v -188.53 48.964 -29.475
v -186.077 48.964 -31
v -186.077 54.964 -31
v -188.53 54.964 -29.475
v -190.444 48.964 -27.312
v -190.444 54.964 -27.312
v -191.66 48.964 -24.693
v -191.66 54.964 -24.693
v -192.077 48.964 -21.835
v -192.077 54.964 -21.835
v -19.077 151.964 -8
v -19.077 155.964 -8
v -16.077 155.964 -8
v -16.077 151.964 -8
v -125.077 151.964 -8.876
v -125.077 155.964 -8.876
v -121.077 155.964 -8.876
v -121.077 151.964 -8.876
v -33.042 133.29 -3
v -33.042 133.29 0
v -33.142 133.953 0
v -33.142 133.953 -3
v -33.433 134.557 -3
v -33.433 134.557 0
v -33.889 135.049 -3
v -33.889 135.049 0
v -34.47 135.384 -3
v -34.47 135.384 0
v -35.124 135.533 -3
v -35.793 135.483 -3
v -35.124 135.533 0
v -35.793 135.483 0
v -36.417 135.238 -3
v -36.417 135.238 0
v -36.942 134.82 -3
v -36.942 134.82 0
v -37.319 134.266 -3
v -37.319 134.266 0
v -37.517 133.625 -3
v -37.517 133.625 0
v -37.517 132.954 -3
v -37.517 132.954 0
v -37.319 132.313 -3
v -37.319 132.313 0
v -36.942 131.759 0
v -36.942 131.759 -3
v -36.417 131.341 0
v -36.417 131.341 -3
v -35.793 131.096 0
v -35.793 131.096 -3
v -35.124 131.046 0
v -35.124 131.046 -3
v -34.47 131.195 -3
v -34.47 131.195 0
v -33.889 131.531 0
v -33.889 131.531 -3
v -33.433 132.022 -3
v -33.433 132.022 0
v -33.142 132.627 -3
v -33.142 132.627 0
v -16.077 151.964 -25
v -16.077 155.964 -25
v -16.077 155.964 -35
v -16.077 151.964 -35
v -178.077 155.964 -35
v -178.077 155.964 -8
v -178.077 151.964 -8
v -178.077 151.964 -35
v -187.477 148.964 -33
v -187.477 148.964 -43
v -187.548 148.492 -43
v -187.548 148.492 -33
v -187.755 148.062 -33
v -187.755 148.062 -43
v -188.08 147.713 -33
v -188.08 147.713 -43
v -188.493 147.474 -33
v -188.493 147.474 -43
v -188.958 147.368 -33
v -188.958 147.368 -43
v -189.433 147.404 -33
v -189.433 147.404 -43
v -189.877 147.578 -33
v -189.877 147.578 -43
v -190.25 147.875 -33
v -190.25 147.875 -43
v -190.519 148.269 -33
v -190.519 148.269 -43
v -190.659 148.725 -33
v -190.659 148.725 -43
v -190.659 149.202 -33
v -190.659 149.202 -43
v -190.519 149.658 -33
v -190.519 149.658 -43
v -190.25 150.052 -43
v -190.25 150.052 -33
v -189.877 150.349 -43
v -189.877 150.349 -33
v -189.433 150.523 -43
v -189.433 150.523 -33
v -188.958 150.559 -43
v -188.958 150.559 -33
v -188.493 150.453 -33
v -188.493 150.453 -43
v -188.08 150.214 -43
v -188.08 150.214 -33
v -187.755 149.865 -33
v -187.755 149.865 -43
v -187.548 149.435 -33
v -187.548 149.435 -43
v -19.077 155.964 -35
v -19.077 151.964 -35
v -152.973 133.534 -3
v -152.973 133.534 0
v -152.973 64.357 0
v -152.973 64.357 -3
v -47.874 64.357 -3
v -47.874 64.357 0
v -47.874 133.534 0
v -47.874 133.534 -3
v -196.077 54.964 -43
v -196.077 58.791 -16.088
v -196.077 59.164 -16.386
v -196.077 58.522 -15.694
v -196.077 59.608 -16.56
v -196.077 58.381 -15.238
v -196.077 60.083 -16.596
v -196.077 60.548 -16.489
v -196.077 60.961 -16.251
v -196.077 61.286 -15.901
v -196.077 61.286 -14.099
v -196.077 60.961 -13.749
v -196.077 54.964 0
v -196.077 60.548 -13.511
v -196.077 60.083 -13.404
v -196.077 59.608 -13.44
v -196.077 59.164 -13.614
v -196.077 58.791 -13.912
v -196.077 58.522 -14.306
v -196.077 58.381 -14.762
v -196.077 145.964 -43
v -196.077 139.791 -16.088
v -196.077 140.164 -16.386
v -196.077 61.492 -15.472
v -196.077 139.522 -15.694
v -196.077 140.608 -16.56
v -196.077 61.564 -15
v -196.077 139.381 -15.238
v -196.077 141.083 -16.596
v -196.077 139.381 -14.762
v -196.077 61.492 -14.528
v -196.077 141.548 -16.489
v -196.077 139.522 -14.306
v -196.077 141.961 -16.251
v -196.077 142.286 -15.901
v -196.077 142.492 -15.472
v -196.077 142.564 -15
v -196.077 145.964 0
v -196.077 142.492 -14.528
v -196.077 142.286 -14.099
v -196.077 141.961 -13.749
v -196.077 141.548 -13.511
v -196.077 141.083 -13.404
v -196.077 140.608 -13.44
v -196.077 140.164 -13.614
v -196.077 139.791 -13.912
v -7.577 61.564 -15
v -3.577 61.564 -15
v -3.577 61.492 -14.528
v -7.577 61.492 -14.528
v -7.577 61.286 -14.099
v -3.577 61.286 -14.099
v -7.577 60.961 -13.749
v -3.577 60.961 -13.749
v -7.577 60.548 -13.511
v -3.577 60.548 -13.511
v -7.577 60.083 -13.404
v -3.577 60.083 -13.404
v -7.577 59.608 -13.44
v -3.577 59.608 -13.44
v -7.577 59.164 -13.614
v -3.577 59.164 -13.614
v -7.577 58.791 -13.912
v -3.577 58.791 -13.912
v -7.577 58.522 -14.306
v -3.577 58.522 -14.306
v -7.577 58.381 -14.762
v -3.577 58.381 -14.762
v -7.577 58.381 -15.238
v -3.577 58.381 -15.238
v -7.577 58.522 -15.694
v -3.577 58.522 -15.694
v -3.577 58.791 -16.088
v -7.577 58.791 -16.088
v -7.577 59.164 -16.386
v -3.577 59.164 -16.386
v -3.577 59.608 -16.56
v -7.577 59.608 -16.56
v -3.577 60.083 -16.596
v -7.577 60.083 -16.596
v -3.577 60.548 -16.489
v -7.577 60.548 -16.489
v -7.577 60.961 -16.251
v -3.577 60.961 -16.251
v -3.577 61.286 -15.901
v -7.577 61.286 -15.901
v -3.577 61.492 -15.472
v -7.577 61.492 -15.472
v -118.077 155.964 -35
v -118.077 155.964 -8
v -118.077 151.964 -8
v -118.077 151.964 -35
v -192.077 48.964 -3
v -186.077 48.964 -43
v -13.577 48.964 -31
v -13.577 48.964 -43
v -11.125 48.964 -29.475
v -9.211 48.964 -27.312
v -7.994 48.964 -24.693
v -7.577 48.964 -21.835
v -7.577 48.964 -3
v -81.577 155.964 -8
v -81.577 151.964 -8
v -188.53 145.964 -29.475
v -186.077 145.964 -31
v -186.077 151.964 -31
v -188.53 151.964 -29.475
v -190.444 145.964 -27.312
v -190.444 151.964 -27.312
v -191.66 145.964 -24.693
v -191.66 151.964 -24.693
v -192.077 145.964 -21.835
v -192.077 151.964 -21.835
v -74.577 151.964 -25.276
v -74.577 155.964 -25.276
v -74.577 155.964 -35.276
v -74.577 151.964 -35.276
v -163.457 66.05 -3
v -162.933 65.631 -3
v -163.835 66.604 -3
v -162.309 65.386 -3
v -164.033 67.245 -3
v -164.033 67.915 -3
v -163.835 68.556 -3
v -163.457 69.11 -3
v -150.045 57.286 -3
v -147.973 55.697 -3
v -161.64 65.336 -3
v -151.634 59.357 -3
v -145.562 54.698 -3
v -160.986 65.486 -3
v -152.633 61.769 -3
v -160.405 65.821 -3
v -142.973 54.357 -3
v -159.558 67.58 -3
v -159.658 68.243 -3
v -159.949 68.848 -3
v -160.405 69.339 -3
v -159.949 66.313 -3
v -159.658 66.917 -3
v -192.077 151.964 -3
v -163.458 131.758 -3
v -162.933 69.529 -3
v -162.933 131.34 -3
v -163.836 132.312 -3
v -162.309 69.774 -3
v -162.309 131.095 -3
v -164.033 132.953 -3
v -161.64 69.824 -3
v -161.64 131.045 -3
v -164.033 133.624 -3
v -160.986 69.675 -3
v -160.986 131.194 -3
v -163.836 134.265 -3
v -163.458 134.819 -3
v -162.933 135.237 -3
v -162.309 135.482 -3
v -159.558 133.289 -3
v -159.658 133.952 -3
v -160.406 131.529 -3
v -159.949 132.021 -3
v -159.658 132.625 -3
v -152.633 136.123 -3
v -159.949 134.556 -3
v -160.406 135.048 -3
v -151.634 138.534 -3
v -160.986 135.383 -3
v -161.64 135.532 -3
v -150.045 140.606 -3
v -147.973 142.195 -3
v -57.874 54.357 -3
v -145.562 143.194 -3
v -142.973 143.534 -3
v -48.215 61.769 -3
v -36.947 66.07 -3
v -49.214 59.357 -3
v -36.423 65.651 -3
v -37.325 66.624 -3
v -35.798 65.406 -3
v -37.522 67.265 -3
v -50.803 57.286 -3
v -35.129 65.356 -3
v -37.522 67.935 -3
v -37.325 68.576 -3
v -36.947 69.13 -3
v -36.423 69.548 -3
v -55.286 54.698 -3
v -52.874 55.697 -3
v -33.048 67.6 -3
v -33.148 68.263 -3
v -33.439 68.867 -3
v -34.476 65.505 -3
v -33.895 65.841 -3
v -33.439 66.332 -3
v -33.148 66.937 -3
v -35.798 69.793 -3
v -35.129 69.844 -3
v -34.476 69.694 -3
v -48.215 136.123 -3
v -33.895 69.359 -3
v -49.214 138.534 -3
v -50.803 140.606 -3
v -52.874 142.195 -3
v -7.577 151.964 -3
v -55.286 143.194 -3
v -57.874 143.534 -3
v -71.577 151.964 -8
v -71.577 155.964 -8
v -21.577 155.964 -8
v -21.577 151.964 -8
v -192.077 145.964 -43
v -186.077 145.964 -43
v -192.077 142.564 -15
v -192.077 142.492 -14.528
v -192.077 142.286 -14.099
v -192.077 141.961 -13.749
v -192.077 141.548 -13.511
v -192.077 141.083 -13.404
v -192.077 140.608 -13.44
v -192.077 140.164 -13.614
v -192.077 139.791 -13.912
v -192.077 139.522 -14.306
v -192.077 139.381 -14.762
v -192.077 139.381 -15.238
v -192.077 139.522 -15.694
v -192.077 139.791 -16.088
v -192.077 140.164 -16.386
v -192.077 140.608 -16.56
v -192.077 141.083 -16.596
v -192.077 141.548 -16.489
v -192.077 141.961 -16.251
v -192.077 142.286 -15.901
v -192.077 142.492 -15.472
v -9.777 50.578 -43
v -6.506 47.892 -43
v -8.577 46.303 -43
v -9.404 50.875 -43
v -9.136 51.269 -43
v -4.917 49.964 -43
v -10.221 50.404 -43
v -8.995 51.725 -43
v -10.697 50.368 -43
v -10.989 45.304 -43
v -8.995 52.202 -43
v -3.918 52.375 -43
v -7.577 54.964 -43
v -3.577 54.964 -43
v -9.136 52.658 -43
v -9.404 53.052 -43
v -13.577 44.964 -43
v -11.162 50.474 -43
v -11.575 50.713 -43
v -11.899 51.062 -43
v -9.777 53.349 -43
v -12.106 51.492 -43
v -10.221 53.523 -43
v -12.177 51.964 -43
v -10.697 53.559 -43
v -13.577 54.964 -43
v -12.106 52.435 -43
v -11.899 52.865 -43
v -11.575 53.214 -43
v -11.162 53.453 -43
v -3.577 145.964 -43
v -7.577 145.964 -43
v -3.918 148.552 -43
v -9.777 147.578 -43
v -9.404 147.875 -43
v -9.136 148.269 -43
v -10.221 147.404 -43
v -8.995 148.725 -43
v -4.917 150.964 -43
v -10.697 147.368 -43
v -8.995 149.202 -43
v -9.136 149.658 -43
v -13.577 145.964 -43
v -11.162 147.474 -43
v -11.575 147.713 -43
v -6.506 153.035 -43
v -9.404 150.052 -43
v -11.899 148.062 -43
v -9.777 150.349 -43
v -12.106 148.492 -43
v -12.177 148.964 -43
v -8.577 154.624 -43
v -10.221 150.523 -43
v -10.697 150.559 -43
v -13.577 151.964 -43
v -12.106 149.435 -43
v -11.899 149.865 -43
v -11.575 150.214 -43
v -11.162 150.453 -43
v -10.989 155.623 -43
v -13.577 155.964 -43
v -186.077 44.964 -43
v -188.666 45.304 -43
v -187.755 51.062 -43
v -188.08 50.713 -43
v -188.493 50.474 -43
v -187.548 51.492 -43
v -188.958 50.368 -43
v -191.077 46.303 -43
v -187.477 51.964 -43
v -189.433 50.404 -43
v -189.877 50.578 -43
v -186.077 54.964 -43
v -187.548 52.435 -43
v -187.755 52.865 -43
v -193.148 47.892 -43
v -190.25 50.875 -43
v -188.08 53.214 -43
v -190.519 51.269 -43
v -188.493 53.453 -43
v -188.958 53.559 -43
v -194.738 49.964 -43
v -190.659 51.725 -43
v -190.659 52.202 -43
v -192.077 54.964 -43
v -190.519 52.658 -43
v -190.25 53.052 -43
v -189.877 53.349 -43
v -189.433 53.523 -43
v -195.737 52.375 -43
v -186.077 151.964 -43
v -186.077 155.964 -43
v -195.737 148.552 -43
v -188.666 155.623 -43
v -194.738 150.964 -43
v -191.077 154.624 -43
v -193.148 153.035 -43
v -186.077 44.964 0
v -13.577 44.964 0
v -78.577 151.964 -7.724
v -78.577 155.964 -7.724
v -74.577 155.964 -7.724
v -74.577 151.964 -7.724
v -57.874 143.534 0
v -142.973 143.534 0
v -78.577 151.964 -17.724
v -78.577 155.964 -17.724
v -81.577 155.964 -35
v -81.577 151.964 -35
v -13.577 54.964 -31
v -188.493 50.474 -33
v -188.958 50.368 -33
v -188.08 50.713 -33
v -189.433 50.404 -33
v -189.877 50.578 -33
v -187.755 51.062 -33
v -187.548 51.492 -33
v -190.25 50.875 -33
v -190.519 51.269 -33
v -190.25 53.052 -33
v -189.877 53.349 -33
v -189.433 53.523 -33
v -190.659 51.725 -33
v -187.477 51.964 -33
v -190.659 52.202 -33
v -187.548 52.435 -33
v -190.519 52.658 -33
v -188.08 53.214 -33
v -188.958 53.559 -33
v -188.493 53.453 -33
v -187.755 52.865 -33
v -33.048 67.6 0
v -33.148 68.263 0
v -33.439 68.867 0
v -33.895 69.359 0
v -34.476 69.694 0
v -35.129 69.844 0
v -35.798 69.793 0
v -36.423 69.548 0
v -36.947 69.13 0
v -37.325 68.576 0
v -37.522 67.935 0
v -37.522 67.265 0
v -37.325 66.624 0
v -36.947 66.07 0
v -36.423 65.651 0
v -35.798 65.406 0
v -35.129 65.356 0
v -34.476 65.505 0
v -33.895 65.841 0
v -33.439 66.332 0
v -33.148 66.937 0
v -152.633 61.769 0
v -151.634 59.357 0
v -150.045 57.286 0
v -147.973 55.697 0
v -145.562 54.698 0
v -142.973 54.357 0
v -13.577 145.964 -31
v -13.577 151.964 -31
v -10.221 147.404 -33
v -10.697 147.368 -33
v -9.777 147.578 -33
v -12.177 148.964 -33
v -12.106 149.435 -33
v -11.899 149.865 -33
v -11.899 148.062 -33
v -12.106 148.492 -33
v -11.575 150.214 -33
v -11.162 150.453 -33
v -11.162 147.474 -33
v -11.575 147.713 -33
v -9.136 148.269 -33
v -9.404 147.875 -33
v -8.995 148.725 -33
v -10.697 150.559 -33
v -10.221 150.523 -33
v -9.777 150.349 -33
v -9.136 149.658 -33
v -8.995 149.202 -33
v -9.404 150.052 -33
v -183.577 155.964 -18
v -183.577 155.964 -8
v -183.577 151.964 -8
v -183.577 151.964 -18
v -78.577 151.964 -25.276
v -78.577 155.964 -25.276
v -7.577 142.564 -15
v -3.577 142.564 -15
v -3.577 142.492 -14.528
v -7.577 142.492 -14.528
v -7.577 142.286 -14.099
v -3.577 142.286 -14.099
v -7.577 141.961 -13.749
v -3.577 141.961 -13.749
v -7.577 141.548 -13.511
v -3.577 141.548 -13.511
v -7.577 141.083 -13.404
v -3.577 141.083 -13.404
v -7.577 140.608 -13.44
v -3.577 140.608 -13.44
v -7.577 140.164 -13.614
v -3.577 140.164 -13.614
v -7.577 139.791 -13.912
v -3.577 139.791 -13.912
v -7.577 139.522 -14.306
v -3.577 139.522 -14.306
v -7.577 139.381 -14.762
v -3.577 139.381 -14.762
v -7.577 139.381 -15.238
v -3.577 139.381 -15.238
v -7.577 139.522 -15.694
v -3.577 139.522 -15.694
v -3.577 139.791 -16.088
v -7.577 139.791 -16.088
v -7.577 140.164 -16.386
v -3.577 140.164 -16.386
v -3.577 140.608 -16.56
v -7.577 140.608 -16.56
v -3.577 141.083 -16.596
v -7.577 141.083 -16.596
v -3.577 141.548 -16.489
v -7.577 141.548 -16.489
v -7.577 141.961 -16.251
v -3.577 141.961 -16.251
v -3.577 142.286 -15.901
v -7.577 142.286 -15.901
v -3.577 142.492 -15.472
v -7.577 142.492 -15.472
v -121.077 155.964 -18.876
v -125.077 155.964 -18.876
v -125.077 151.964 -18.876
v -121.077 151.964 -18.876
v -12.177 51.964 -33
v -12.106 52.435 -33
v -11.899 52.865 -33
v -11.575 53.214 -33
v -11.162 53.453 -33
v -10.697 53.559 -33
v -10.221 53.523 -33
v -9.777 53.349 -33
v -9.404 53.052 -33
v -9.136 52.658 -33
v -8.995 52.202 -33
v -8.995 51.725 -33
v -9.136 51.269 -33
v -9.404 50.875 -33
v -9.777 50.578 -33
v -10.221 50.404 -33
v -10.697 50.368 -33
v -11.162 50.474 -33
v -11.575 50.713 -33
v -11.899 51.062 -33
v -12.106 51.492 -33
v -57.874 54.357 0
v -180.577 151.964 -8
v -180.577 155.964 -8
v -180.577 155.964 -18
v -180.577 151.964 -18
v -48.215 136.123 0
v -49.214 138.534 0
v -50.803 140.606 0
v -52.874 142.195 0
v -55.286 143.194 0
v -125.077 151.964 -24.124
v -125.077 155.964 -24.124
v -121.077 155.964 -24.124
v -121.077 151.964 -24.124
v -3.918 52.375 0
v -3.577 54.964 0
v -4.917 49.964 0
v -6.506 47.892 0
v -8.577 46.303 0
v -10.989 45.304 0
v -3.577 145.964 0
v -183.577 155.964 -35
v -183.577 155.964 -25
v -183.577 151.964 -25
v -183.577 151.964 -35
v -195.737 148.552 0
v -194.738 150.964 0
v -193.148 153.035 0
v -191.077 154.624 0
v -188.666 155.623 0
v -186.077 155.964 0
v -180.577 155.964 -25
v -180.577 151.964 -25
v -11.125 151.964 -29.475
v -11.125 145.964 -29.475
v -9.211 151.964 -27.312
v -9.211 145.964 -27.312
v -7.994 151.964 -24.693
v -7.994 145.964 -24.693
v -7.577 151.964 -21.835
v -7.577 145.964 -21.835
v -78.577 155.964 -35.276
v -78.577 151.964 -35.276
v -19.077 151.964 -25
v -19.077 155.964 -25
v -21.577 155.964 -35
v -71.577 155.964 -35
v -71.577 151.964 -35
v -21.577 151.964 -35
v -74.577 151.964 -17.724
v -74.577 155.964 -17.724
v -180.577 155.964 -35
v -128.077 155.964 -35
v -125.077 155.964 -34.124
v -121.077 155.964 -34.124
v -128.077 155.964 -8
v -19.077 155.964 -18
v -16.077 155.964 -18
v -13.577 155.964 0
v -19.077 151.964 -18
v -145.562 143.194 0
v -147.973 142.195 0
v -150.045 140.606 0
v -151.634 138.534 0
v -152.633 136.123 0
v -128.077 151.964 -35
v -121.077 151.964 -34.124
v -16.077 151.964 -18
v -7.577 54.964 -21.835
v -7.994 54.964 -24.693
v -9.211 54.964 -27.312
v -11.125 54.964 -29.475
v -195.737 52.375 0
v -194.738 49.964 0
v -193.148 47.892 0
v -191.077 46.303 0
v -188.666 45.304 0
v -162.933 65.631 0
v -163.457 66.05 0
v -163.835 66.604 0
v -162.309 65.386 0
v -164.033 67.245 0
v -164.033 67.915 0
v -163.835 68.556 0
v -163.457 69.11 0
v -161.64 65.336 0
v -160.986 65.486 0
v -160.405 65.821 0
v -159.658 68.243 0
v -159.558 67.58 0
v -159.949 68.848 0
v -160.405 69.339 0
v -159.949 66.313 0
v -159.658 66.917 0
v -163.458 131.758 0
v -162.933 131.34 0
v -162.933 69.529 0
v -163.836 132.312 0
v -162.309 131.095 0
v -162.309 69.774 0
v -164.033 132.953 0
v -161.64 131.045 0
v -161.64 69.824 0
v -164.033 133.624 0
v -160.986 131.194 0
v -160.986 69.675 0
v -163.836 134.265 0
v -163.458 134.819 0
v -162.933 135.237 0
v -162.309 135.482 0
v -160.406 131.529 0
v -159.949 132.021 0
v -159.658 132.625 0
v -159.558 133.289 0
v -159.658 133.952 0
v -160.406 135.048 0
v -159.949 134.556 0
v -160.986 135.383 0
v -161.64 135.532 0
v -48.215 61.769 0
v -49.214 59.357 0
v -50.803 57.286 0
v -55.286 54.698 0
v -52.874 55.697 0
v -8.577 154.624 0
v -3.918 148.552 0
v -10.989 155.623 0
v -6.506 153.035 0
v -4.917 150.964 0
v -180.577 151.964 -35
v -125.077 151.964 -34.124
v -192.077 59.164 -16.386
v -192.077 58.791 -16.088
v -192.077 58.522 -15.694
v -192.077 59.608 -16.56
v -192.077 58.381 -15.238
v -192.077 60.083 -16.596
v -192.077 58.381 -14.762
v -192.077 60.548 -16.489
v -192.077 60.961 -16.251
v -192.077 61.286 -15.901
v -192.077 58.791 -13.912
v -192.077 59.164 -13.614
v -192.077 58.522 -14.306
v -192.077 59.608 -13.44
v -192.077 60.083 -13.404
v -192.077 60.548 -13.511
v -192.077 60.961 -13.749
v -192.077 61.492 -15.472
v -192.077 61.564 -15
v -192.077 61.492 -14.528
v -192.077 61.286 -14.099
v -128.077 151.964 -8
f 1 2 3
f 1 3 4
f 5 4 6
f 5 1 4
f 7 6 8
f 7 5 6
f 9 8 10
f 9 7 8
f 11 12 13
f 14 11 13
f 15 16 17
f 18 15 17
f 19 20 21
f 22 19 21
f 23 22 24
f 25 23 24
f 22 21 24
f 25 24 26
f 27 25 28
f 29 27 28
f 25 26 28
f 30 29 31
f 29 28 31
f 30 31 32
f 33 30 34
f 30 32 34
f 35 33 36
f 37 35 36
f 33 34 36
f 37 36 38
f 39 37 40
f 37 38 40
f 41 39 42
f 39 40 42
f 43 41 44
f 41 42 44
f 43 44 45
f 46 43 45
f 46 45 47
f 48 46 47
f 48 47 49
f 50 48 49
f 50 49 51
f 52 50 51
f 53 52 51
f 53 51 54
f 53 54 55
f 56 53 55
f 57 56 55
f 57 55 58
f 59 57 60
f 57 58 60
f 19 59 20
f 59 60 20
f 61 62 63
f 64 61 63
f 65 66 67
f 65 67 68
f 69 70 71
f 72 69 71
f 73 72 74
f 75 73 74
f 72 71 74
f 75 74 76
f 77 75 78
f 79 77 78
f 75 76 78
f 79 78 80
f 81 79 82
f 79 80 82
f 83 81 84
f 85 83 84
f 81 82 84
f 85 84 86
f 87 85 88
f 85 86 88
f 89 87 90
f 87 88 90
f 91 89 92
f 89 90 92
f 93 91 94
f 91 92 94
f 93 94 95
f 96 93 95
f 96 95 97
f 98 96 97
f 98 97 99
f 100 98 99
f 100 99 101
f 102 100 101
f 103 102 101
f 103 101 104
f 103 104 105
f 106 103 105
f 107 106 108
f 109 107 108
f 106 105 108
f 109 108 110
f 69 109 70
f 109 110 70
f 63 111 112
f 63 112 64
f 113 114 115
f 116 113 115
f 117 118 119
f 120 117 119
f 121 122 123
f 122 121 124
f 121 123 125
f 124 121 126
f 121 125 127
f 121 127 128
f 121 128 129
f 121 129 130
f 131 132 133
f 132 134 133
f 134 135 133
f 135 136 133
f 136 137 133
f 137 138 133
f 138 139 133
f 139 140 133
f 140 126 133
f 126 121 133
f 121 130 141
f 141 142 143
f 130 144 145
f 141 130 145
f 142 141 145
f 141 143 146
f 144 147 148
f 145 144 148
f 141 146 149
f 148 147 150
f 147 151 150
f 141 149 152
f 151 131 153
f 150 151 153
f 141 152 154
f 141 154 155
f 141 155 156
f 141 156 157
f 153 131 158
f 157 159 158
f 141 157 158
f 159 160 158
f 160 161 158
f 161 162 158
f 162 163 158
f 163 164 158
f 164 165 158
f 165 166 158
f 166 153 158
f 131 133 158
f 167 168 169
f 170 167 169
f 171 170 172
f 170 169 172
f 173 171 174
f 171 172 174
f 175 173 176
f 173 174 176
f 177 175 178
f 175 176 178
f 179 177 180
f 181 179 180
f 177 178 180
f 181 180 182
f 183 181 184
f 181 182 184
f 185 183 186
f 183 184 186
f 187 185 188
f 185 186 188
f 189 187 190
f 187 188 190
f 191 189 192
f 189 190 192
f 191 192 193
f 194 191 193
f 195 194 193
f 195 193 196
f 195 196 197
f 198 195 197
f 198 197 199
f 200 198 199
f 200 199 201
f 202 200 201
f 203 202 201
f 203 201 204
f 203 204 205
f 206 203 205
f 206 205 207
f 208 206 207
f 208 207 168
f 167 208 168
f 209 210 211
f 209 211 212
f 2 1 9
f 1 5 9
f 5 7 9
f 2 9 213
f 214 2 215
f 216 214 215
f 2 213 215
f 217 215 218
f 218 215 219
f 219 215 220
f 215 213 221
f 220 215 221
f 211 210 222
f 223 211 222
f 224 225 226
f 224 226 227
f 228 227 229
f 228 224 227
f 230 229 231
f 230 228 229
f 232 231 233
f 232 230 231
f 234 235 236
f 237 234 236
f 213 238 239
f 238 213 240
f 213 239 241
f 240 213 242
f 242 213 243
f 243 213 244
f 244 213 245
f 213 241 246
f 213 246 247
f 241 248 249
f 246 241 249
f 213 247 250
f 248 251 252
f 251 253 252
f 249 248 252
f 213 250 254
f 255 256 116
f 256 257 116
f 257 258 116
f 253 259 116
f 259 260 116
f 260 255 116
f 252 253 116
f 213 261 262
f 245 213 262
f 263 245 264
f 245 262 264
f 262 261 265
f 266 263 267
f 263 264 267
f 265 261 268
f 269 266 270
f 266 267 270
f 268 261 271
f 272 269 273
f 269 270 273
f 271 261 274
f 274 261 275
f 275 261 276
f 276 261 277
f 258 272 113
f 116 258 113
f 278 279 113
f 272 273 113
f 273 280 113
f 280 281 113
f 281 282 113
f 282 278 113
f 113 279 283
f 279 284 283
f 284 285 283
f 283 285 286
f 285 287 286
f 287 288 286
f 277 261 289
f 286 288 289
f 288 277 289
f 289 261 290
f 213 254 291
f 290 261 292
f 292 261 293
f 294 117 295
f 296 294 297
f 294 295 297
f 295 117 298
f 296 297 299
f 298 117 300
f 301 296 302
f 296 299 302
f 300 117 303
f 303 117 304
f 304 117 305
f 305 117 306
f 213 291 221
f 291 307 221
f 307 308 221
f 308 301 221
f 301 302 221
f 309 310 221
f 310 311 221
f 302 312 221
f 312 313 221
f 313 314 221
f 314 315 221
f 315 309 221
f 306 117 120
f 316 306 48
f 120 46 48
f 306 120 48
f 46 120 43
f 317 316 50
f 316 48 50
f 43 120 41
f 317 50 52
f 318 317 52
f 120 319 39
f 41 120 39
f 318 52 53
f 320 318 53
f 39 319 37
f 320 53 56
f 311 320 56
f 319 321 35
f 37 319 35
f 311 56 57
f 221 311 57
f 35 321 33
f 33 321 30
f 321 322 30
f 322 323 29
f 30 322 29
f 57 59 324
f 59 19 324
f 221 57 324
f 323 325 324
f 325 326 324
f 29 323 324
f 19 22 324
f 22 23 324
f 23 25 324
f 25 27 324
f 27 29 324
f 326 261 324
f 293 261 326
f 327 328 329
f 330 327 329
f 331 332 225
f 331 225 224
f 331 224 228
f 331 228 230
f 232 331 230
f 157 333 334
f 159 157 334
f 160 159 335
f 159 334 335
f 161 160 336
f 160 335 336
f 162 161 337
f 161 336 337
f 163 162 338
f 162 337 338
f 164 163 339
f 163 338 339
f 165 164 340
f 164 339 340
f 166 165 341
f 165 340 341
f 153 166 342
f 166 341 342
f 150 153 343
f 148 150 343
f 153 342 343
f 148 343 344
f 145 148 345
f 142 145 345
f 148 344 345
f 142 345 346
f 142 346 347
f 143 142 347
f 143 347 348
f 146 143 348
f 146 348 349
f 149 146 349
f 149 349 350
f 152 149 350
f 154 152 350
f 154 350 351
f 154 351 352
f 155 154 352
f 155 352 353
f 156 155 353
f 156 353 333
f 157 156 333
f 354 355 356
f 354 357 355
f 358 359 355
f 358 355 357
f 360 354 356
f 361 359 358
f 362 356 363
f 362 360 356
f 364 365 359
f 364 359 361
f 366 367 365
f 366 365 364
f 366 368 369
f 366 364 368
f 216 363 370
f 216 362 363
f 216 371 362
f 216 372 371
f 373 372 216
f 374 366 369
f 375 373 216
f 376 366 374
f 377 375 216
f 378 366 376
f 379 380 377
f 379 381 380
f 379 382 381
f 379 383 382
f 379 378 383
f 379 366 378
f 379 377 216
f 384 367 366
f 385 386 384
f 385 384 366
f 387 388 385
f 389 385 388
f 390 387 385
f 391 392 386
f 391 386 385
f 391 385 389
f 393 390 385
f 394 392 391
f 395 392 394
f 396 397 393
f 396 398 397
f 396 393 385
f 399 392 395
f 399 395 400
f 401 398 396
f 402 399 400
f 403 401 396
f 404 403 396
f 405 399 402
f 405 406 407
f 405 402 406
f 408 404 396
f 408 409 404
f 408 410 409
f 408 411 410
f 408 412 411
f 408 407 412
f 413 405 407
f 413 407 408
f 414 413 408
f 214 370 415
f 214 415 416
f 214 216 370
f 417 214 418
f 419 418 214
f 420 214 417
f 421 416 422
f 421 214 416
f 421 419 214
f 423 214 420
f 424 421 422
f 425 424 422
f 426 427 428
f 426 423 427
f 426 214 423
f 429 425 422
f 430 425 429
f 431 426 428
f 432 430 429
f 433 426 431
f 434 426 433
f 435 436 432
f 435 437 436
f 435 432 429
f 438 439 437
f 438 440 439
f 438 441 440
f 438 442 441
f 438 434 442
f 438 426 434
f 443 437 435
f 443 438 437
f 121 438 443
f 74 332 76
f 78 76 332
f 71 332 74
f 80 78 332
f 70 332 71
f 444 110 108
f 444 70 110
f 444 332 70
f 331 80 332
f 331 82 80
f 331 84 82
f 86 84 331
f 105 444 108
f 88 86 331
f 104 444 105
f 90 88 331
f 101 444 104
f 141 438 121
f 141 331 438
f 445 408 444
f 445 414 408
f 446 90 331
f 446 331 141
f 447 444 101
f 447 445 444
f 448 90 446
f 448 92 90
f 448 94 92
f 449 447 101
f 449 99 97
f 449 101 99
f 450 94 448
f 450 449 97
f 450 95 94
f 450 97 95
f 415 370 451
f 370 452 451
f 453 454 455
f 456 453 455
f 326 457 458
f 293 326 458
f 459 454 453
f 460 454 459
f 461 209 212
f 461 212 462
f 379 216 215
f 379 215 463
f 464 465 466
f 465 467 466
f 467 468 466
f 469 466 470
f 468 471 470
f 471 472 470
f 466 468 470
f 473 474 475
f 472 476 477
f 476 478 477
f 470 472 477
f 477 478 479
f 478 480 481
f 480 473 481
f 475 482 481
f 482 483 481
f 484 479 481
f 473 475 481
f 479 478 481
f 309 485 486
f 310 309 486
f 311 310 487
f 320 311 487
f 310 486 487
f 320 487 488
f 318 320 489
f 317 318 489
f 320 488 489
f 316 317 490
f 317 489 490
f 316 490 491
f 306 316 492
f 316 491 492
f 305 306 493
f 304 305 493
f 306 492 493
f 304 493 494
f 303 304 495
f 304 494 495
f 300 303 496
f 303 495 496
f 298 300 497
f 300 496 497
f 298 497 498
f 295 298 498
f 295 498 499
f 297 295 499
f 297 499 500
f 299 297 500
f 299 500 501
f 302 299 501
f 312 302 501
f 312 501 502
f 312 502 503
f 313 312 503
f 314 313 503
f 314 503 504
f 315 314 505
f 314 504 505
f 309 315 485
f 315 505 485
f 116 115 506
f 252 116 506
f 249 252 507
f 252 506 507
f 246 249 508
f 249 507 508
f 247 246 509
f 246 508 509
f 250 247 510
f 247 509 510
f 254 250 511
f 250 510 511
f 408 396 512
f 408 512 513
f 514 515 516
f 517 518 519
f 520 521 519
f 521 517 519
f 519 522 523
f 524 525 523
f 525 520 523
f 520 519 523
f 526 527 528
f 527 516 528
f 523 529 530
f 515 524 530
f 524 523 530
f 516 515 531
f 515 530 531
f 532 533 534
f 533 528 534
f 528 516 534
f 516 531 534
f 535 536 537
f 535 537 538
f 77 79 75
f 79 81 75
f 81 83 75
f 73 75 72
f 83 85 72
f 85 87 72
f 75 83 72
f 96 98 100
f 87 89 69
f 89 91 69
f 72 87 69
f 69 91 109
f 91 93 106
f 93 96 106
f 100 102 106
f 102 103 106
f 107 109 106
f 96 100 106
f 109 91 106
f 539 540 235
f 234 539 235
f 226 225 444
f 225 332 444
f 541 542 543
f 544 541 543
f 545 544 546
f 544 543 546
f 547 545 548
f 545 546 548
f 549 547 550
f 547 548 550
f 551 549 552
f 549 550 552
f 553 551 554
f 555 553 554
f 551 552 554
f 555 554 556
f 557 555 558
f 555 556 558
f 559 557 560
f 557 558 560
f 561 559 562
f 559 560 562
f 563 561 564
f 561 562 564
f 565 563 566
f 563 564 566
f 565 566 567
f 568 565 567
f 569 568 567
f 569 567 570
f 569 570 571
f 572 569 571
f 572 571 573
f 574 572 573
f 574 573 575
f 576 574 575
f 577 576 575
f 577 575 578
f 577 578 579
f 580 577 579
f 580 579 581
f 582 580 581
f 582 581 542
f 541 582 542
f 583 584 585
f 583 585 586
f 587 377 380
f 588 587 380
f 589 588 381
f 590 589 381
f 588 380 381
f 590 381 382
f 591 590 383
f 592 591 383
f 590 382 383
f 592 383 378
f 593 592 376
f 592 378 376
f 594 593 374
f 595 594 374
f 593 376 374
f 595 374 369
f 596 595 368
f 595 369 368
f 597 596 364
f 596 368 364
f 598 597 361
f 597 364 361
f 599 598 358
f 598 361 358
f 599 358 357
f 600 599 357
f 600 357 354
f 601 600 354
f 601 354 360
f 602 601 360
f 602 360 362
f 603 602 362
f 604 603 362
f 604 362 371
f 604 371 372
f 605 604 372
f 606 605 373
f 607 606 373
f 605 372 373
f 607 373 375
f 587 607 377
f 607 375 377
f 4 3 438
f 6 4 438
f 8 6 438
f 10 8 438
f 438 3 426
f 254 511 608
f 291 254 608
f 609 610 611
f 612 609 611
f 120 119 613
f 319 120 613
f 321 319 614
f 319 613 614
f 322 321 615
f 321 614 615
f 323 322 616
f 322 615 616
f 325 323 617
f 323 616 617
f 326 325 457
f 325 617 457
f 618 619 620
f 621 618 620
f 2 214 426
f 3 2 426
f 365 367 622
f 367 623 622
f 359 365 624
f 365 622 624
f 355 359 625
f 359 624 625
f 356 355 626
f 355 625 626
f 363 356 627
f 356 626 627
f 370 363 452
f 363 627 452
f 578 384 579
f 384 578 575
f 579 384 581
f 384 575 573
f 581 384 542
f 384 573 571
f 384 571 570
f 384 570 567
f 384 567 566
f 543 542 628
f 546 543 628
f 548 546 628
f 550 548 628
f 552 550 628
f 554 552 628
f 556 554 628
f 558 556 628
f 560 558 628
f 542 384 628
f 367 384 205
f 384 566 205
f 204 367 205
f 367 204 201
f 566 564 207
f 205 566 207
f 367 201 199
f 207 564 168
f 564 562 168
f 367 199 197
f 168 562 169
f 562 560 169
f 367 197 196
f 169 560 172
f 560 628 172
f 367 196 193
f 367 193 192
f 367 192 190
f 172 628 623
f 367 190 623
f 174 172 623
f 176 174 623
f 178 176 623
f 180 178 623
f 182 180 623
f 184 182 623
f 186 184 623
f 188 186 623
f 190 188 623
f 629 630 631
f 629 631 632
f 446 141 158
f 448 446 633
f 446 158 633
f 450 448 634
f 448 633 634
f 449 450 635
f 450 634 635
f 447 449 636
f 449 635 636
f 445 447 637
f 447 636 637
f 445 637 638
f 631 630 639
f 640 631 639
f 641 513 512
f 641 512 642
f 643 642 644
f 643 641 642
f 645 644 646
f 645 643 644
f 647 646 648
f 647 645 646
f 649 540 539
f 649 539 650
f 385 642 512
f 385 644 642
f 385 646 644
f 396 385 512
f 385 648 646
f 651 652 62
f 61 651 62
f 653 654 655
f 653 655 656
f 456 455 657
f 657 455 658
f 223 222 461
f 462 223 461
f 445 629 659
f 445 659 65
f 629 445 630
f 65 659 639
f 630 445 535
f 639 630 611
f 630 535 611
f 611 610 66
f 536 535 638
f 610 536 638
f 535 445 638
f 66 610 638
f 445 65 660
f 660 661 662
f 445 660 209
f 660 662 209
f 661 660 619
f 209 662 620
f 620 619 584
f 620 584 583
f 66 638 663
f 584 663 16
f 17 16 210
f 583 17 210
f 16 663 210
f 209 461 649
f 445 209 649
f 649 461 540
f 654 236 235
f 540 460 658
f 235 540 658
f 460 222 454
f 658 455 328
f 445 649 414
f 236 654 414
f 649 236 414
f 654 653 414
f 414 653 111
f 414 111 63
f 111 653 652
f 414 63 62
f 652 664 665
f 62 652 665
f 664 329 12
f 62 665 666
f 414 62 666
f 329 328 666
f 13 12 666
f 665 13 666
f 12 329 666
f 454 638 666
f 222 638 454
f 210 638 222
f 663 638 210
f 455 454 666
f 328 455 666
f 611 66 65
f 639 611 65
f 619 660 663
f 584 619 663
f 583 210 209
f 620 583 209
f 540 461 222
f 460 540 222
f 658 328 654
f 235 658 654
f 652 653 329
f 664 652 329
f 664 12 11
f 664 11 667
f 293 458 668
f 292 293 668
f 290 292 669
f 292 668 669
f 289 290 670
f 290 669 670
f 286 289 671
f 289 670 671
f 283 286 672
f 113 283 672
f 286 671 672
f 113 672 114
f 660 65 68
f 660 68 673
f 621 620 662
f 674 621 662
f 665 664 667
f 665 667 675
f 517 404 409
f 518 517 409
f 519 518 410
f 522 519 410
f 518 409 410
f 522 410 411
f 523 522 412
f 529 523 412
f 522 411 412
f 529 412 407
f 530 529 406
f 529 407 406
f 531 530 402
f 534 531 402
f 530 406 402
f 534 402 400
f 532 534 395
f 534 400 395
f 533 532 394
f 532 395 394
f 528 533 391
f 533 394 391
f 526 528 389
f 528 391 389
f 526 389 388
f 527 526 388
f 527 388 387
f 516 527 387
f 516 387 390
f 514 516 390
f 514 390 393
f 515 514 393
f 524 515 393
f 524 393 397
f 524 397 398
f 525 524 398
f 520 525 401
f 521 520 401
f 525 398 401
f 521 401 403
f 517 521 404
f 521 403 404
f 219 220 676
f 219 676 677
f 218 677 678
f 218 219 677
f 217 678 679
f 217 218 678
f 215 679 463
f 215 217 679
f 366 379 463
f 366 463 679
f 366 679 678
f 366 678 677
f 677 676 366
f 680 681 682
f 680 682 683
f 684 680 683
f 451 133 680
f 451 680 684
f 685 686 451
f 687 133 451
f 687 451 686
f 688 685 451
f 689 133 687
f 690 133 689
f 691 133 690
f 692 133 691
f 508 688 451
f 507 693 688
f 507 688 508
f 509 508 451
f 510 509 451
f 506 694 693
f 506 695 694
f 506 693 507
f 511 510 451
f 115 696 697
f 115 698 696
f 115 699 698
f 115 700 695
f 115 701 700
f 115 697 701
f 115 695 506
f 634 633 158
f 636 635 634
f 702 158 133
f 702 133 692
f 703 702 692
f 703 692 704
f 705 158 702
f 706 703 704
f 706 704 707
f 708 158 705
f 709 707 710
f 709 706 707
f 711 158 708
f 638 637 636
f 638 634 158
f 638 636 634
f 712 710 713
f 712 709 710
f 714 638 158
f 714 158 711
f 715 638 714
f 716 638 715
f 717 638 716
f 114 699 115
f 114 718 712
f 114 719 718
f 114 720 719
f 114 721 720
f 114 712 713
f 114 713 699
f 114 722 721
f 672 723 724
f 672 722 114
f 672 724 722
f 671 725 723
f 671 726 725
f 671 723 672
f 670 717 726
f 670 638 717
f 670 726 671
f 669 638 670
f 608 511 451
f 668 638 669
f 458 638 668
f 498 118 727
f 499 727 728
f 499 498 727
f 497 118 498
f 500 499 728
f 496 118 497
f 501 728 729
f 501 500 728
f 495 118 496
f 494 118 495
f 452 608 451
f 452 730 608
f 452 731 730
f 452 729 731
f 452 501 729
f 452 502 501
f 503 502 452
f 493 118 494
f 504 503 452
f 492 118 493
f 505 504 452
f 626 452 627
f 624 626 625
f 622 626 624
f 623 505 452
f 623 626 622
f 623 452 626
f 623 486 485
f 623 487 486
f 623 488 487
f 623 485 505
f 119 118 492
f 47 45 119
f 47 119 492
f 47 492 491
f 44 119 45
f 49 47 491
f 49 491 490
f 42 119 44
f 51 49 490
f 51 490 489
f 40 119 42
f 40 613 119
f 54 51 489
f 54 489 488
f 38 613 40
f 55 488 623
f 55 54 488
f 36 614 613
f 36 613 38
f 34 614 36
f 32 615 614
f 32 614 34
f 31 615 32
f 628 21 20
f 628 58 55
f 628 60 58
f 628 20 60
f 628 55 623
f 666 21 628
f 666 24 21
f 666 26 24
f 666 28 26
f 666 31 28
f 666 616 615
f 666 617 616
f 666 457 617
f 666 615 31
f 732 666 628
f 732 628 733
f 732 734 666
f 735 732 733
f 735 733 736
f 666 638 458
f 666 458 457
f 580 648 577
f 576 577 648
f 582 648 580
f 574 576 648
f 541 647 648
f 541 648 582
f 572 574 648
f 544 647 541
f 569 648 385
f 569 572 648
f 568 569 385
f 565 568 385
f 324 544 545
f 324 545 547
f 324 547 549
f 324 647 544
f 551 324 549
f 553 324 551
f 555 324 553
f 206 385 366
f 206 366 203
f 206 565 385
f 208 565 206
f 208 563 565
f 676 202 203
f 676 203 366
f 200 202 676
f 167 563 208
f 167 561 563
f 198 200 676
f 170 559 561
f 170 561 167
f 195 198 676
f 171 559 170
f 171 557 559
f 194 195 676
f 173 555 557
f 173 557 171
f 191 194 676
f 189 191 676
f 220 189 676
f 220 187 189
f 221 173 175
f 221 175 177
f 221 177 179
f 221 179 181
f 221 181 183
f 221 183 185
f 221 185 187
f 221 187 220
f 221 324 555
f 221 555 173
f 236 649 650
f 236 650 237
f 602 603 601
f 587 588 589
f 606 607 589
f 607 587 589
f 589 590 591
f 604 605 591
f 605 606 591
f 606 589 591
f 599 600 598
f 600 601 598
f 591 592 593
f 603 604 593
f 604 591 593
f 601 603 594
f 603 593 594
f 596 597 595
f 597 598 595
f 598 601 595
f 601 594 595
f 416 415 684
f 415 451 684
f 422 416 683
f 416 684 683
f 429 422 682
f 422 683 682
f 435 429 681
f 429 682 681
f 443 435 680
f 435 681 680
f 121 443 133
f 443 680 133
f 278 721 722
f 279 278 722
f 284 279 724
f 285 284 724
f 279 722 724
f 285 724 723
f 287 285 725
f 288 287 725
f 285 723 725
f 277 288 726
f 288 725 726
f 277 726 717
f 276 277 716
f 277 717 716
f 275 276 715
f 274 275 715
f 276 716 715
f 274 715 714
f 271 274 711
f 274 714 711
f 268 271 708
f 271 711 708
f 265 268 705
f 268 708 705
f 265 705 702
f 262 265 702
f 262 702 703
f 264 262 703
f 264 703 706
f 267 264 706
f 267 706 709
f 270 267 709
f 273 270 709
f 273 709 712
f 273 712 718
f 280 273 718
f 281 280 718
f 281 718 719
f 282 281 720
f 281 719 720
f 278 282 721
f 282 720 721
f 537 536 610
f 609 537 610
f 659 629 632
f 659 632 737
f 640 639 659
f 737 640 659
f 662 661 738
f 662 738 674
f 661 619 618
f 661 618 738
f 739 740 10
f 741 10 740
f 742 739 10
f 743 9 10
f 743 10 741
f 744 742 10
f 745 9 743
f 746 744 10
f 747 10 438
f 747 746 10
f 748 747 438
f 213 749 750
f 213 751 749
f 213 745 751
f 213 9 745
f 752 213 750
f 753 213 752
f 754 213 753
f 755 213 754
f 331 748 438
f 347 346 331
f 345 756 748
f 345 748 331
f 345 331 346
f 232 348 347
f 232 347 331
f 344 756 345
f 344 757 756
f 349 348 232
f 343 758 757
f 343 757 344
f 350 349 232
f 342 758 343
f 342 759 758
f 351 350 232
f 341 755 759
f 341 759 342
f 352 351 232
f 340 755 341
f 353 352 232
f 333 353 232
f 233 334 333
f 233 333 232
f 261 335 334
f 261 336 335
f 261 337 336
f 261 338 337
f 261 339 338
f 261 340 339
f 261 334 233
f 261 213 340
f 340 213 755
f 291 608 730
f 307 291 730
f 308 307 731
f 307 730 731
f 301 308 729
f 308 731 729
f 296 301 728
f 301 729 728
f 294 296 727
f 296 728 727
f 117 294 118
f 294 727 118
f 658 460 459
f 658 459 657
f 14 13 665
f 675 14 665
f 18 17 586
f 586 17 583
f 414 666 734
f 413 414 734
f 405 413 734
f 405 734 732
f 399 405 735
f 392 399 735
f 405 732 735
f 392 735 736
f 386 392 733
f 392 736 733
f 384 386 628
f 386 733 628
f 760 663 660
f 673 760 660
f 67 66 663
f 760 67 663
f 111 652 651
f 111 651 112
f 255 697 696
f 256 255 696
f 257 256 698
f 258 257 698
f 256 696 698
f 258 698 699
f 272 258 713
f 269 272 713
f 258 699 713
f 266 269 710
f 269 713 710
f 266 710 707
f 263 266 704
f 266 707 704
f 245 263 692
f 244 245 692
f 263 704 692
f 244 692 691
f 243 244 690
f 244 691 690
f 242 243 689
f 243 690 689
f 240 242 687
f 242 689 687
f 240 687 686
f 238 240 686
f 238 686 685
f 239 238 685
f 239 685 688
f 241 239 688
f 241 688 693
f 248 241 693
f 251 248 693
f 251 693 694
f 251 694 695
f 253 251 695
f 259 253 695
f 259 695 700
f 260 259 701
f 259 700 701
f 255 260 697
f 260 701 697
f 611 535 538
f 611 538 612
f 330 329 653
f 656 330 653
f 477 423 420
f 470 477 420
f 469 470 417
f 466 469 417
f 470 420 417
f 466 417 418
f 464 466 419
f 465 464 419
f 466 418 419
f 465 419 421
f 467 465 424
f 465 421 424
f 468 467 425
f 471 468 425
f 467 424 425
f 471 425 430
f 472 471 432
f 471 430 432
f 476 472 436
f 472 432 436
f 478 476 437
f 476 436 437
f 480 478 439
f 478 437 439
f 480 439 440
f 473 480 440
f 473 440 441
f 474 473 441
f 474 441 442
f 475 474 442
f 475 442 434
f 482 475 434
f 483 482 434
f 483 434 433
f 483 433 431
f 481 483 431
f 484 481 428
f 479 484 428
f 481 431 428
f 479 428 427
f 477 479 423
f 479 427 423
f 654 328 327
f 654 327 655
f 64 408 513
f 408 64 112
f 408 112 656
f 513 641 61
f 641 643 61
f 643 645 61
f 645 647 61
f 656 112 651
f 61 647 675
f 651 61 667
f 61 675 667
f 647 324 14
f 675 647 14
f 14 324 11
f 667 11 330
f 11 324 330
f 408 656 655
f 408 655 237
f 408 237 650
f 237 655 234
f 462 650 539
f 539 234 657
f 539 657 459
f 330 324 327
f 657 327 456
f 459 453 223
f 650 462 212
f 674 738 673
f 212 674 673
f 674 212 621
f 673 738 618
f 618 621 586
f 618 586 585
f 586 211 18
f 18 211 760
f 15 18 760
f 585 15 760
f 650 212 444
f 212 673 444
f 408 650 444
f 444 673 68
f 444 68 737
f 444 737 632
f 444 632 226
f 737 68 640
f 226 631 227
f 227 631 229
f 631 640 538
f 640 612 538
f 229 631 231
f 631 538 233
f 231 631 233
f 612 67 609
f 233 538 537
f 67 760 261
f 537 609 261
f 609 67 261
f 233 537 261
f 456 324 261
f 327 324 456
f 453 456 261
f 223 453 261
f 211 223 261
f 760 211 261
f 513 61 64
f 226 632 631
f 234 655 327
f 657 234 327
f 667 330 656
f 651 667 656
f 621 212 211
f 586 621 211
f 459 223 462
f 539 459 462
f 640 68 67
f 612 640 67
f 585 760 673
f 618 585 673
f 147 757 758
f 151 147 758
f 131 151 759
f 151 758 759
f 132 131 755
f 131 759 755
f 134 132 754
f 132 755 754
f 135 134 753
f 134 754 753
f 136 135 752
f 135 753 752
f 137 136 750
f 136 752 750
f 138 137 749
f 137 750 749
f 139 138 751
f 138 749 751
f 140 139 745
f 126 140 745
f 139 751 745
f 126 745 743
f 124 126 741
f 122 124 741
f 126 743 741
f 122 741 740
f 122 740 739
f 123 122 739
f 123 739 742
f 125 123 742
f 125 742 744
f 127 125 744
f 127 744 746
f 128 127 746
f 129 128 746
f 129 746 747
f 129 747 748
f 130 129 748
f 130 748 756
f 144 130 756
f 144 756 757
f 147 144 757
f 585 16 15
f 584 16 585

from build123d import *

# Parameters (mm, degrees)
SKETCH1_R           = 2.25
BOSS_EXTRUDE1_DEPTH = 3
BOSS_EXTRUDE3_DEPTH = 40
SKETCH4_W           = 6
SKETCH4_H           = 6
SKETCH4_R           = 1.6
BOSS_EXTRUDE4_DEPTH = 10
SKETCH5_W           = 6
SKETCH5_H           = 6
BOSS_EXTRUDE5_DEPTH = 2
FILLET3_R           = 10
SKETCH6_W           = 50
SKETCH6_H           = 27
SKETCH6_W_2         = 36.5
CUT_EXTRUDE1_DEPTH  = 5
SKETCH8_W           = 4
SKETCH8_H           = 10
SKETCH8_W_2         = 3
CUT_EXTRUDE2_DEPTH  = 5
SKETCH9_R           = 1.6
CUT_EXTRUDE3_DEPTH  = 252.455517463


with BuildPart() as part:
    # Sketch1 → Boss-Extrude1 (new body)
    with BuildSketch(Plane.XY):
        with BuildLine():
            Line((-13.577349449, 155.963544659), (-186.077349449, 155.963544659))
            ThreePointArc((-186.077349449, 155.963544659), (-193.148417261, 153.034612471), (-196.077349449, 145.963544659))
            Line((-196.077349449, 145.963544659), (-196.077349449, 54.963544659))
            ThreePointArc((-196.077349449, 54.963544659), (-193.148417261, 47.892476847), (-186.077349449, 44.963544659))
            Line((-186.077349449, 44.963544659), (-13.577349449, 44.963544659))
            ThreePointArc((-13.577349449, 44.963544659), (-6.506281637, 47.892476847), (-3.577349449, 54.963544659))
            Line((-3.577349449, 54.963544659), (-3.577349449, 145.963544659))
            ThreePointArc((-3.577349449, 145.963544659), (-6.506281637, 153.034612471), (-13.577349449, 155.963544659))
        make_face()
        with Locations((-35.292149682, 133.289732278)):
            Circle(SKETCH1_R, mode=Mode.SUBTRACT)
        with Locations((-35.297563809, 67.599891559)):
            Circle(SKETCH1_R, mode=Mode.SUBTRACT)
        with Locations((-161.808024727, 67.580045294)):
            Circle(SKETCH1_R, mode=Mode.SUBTRACT)
        with Locations((-161.808423577, 133.28851775)):
            Circle(SKETCH1_R, mode=Mode.SUBTRACT)
        with BuildLine():
            Line((-57.8741303, 143.534465984), (-142.973432949, 143.534465984))
            ThreePointArc((-142.973432949, 143.534465984), (-150.044500761, 140.605533796), (-152.973432949, 133.534465984))
            Line((-152.973432949, 133.534465984), (-152.973432949, 64.356832554))
            ThreePointArc((-152.973432949, 64.356832554), (-150.044500761, 57.285764742), (-142.973432949, 54.356832554))
            Line((-142.973432949, 54.356832554), (-57.8741303, 54.356832554))
            ThreePointArc((-57.8741303, 54.356832554), (-50.803062488, 57.285764742), (-47.8741303, 64.356832554))
            Line((-47.8741303, 64.356832554), (-47.8741303, 133.534465984))
            ThreePointArc((-47.8741303, 133.534465984), (-50.803062488, 140.605533796), (-57.8741303, 143.534465984))
        make_face(mode=Mode.SUBTRACT)
    extrude(amount=-BOSS_EXTRUDE1_DEPTH)

    # Sketch3 → Boss-Extrude3 (add)
    with BuildSketch(Plane(origin=(0, 0, -3), x_dir=(-1, 0, 0), z_dir=(0, 0, -1))):
        with BuildLine():
            Line((3.577349449, 145.963544659), (3.577349449, 54.963544659))
            ThreePointArc((3.577349449, 54.963544659), (6.506281637, 47.892476847), (13.577349449, 44.963544659))
            Line((13.577349449, 44.963544659), (99.827349449, 44.963544659))
            Line((99.827349449, 44.963544659), (186.077349449, 44.963544659))
            ThreePointArc((186.077349449, 44.963544659), (193.148417261, 47.892476847), (196.077349449, 54.963544659))
            Line((196.077349449, 54.963544659), (196.077349449, 145.963544659))
            ThreePointArc((196.077349449, 145.963544659), (193.148417261, 153.034612471), (186.077349449, 155.963544659))
            Line((186.077349449, 155.963544659), (99.827349449, 155.963544659))
            Line((99.827349449, 155.963544659), (13.577349449, 155.963544659))
            ThreePointArc((13.577349449, 155.963544659), (6.506281637, 153.034612471), (3.577349449, 145.963544659))
        make_face()
        Polygon((7.577349449, 151.963544659), (7.577349449, 48.963544659), (99.827349449, 48.963544659), (192.077349449, 48.963544659), (192.077349449, 151.963544659), (99.827349449, 151.963544659), align=None, mode=Mode.SUBTRACT)
    extrude(amount=BOSS_EXTRUDE3_DEPTH)

    # Sketch4 → Boss-Extrude4 (add)
    # profile 1 of 4: a face of its own
    with BuildSketch(Plane(origin=(0, 0, -43), x_dir=(-1, 0, 0), z_dir=(0, 0, -1))):
        with Locations((10.577349449, 148.963544659)):
            Rectangle(SKETCH4_W, SKETCH4_H)
        with Locations((10.577349449, 148.963544659)):
            Circle(SKETCH4_R, mode=Mode.SUBTRACT)
    # profile 2 of 4: a face of its own
    with BuildSketch(Plane(origin=(0, 0, -43), x_dir=(-1, 0, 0), z_dir=(0, 0, -1))):
        with Locations((189.077349449, 148.963544659)):
            Rectangle(SKETCH4_W, SKETCH4_H)
        with Locations(Location((189.077349449, 148.963544659, 0), (0, 0, 180))):
            Circle(SKETCH4_R, mode=Mode.SUBTRACT)
    # profile 3 of 4: a face of its own
    with BuildSketch(Plane(origin=(0, 0, -43), x_dir=(-1, 0, 0), z_dir=(0, 0, -1))):
        with Locations((189.077349449, 51.963544659)):
            Rectangle(SKETCH4_W, SKETCH4_H)
        with Locations(Location((189.077349449, 51.963544659, 0), (0, 0, 180))):
            Circle(SKETCH4_R, mode=Mode.SUBTRACT)
    # profile 4 of 4: a face of its own
    with BuildSketch(Plane(origin=(0, 0, -43), x_dir=(-1, 0, 0), z_dir=(0, 0, -1))):
        with Locations((10.577349449, 51.963544659)):
            Rectangle(SKETCH4_W, SKETCH4_H)
        with Locations((10.577349449, 51.963544659)):
            Circle(SKETCH4_R, mode=Mode.SUBTRACT)
    extrude(amount=-BOSS_EXTRUDE4_DEPTH)

    # Sketch5 → Boss-Extrude5 (add)
    with BuildSketch(Plane.XY.offset(-33)):
        with Locations((-189.077349449, 148.963544659)):
            Rectangle(SKETCH5_W, SKETCH5_H)
        with Locations((-189.077349449, 51.963544659)):
            Rectangle(SKETCH5_W, SKETCH5_H)
        with Locations((-10.577349449, 51.963544659)):
            Rectangle(SKETCH5_W, SKETCH5_H)
        with Locations((-10.577349449, 148.963544659)):
            Rectangle(SKETCH5_W, SKETCH5_H)
    extrude(amount=BOSS_EXTRUDE5_DEPTH)

    # Fillet3
    # the kernel refuses this fillet: 10 mm, written as the material it adds along each edge
    with BuildSketch(Plane(origin=(-192.077349449, 145.963544659, -31), x_dir=(1, 0, 0), z_dir=(0, 1, 0)), Plane(origin=(-7.577349449, 151.963544659, -31), x_dir=(-1, 0, 0), z_dir=(0, -1, 0))) as fillet3_piece_1:
        with BuildLine():
            CenterArc((10, -9.16515139), FILLET3_R, 113.578178478, 66.421821522)
            Line((0, -9.16515139), (-0.2, -9.16515139))
            Line((-0.2, -9.16515139), (-0.2, 0))
            Line((-0.2, 0), (0, 0.2))
            ThreePointArc((0, 0.2), (3, 0.2), (5.92, 0.183303028))
            Line((5.92, 0.183303028), (6, 0))
        make_face()
    extrude(amount=6)
    with BuildSketch(Plane(origin=(-192.077349449, 48.963544659, -31), x_dir=(0, 0, 1), z_dir=(0, 1, 0))) as fillet3_piece_2:
        with BuildLine():
            CenterArc((9.16515139, 10), FILLET3_R, 203.578178478, 66.421821522)
            Line((0, 6), (-0.183303028, 5.92))
            ThreePointArc((-0.183303028, 5.92), (-0.2, 3), (-0.2, 0))
            Line((-0.2, 0), (0, -0.2))
            Line((0, -0.2), (9.16515139, -0.2))
            Line((9.16515139, -0.2), (9.16515139, 0))
        make_face()
    extrude(amount=6)
    with BuildSketch(Plane(origin=(-7.577349449, 48.963544659, -31), x_dir=(-1, 0, 0), z_dir=(0, 1, 0))) as fillet3_piece_3:
        with BuildLine():
            CenterArc((10, 9.16515139), FILLET3_R, 180, 66.421821522)
            Line((0, 9.16515139), (-0.2, 9.16515139))
            Line((-0.2, 9.16515139), (-0.2, 0))
            Line((-0.2, 0), (0, -0.2))
            ThreePointArc((0, -0.2), (3, -0.2), (5.92, -0.183303028))
            Line((5.92, -0.183303028), (6, 0))
        make_face()
    extrude(amount=6)

    # Sketch6 → Cut-Extrude1 (cut)
    with BuildSketch(Plane(origin=(0, 155.963544659, 0), x_dir=(1, 0, 0), z_dir=(0, 1, 0))):
        with Locations((-153.077349449, 21.5)):
            Rectangle(SKETCH6_W, SKETCH6_H)
        with Locations((-99.827349449, 21.5)):
            Rectangle(SKETCH6_W_2, SKETCH6_H)
        with Locations((-46.577349449, 21.5)):
            Rectangle(SKETCH6_W, SKETCH6_H)
    extrude(amount=-CUT_EXTRUDE1_DEPTH, mode=Mode.SUBTRACT)

    # Sketch8 → Cut-Extrude2 (cut)
    with BuildSketch(Plane(origin=(0, 155.963544659, 0), x_dir=(1, 0, 0), z_dir=(0, 1, 0))):
        with Locations((-123.077349449, 13.876287988)):
            Rectangle(SKETCH8_W, SKETCH8_H)
        with Locations((-76.577349449, 12.724006881)):
            Rectangle(SKETCH8_W, SKETCH8_H)
        with Locations((-76.577349449, 30.275993119)):
            Rectangle(SKETCH8_W, SKETCH8_H)
        with Locations((-123.077349449, 29.123712012)):
            Rectangle(SKETCH8_W, SKETCH8_H)
        with Locations((-17.577349449, 13)):
            Rectangle(SKETCH8_W_2, SKETCH8_H)
        with Locations((-182.077349449, 13)):
            Rectangle(SKETCH8_W_2, SKETCH8_H)
        with Locations((-17.577349449, 30)):
            Rectangle(SKETCH8_W_2, SKETCH8_H)
        with Locations((-182.077349449, 30)):
            Rectangle(SKETCH8_W_2, SKETCH8_H)
    extrude(amount=-CUT_EXTRUDE2_DEPTH, mode=Mode.SUBTRACT)

    # Sketch9 → Cut-Extrude3 (cut, through all)
    with BuildSketch(Plane(origin=(-3.577349449, 0, 0), x_dir=(0, 0, -1), z_dir=(1, 0, 0))):
        with Locations(Location((15, 140.963544659, 0), (0, 0, 90))):
            Circle(SKETCH9_R)
        with Locations(Location((15, 59.963544659, 0), (0, 0, 90))):
            Circle(SKETCH9_R)
    extrude(amount=-CUT_EXTRUDE3_DEPTH, mode=Mode.SUBTRACT)


solid = part.part
